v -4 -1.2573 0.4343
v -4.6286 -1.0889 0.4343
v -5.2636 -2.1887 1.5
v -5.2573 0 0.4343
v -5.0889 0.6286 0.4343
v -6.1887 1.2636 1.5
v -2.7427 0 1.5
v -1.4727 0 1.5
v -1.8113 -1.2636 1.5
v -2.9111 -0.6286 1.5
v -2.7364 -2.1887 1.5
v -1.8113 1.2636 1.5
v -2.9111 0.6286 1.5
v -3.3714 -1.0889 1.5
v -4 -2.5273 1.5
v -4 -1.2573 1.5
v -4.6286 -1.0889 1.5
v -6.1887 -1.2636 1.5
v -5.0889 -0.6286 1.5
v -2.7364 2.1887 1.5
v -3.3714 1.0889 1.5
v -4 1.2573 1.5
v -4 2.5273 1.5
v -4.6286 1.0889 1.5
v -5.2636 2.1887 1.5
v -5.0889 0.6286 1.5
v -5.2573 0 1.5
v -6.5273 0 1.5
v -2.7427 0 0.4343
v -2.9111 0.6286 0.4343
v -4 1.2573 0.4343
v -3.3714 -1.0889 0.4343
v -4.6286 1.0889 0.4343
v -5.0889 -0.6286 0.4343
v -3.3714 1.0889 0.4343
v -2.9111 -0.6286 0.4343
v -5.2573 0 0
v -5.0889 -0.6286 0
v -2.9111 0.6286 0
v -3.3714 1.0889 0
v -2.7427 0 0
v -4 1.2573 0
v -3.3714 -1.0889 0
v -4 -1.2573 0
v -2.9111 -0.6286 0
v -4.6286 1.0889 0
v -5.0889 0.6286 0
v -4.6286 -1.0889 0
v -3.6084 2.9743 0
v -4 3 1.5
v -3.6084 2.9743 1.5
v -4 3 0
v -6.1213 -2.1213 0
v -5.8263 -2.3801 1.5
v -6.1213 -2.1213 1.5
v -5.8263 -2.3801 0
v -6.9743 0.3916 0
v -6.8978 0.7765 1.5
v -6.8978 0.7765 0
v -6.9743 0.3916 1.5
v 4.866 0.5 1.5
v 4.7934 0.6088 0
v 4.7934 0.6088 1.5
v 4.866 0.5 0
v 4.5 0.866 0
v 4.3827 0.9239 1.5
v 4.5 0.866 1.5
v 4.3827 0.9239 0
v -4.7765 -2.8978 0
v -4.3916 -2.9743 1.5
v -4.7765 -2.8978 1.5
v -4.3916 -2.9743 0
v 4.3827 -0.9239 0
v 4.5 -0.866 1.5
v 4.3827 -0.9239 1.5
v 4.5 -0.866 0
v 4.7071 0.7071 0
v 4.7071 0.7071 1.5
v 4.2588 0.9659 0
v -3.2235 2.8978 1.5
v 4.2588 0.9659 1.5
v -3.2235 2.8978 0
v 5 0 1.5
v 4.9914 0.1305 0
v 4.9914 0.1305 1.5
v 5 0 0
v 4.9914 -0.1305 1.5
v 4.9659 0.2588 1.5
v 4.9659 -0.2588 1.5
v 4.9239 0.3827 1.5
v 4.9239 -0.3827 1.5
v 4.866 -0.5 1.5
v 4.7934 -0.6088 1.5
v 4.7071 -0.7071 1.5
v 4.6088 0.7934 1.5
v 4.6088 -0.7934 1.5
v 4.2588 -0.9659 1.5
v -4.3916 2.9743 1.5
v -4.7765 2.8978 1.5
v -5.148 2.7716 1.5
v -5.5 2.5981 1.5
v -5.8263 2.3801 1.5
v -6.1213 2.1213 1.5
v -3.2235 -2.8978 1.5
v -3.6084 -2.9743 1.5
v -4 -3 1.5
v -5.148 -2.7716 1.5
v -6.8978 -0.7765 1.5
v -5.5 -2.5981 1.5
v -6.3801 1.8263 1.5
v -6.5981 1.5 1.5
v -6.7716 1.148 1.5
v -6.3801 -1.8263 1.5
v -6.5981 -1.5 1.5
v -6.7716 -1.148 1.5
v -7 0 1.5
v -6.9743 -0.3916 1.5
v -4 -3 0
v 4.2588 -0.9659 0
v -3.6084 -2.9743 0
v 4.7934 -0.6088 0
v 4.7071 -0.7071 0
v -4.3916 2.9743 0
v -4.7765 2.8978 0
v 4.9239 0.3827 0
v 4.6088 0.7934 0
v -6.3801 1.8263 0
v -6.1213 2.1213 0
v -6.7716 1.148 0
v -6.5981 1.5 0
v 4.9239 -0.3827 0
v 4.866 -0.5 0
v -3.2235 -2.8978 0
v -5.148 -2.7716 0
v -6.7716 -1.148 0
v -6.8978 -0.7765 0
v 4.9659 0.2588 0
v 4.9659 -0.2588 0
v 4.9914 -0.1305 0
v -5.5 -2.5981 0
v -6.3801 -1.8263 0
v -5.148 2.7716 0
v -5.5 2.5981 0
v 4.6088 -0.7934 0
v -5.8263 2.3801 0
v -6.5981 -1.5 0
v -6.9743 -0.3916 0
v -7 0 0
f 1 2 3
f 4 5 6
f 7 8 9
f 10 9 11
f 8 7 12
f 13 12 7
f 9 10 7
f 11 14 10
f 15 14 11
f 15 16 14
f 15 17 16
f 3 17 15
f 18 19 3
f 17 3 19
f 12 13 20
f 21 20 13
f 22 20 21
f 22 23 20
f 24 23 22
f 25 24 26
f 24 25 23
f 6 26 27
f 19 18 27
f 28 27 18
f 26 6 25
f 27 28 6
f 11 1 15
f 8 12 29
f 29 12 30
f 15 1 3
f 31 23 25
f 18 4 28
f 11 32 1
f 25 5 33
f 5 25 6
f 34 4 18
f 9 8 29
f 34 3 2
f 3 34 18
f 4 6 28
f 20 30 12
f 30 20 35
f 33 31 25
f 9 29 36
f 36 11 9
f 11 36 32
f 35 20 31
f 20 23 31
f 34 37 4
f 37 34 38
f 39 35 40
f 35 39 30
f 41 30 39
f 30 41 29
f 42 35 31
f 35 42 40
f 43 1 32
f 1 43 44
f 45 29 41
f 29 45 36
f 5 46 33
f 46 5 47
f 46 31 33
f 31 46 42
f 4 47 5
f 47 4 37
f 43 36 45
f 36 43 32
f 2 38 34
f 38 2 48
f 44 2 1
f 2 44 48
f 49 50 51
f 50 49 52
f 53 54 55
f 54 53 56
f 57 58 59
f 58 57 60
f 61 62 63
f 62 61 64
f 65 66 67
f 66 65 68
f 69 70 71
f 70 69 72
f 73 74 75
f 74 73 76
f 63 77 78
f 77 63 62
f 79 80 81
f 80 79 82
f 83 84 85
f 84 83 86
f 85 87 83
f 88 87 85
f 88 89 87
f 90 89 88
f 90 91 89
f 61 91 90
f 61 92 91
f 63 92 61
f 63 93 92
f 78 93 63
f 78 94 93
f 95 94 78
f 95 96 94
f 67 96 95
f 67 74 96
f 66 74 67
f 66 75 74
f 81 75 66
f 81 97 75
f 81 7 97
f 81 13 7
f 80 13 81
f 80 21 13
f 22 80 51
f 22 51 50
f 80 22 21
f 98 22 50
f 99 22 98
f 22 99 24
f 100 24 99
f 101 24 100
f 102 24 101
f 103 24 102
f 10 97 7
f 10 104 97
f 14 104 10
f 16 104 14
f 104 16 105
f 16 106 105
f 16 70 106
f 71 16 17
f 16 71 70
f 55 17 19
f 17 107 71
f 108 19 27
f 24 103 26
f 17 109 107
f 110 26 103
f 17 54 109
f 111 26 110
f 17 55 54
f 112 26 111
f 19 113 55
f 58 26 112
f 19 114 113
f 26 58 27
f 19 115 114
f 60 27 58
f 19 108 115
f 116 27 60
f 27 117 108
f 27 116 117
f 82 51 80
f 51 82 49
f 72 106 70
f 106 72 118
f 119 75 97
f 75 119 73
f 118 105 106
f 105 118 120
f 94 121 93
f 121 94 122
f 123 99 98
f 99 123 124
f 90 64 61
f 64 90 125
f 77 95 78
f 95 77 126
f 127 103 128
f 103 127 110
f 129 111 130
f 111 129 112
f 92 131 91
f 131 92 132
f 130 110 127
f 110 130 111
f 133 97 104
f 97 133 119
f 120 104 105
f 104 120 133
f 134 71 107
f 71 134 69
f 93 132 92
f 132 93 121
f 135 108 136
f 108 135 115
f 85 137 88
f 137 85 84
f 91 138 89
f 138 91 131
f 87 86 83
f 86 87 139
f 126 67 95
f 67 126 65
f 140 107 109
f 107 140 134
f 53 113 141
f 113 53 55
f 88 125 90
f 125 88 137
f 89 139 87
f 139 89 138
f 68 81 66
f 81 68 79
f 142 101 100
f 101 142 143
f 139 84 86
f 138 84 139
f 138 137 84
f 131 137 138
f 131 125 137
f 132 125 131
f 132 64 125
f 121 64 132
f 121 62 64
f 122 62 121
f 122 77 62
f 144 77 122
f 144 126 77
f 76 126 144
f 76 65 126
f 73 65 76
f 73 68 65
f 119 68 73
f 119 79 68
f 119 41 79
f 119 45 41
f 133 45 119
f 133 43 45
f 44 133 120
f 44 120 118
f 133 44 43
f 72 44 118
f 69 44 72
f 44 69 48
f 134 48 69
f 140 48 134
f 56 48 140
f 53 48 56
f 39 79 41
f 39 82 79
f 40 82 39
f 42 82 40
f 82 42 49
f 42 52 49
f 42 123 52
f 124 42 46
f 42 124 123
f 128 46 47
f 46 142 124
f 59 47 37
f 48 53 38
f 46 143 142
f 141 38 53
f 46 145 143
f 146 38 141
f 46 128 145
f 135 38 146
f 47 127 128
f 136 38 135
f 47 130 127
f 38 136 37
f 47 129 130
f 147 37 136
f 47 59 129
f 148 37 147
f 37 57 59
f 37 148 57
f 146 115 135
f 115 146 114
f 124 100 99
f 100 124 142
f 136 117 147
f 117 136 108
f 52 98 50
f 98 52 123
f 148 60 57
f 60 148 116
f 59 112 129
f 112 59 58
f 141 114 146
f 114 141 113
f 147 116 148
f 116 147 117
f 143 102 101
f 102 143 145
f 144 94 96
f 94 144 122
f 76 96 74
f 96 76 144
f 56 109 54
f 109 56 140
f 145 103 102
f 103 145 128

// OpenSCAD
// Small picture frame clip

// Copyright (C) 2020 Jeremy Bennett <www.jeremybennett.com>

// Contributor: Jeremy Bennett <jeremy.bennett@embecosm.com>

// This file is licensed under the Creative Commons Attribution-ShareAlike 3.0
// Unported License. To view a copy of this license, visit
// http://creativecommons.org/licenses/by-sa/3.0/ or send a letter to Creative
// Commons, PO Box 1866, Mountain View, CA 94042, USA.


// Dimensions of a 3/8" no 3 wood screw

HEAD_DIAM = 0.199 * 25.4;           // x
SHANK_DIAM = 0.099 * 25.4;          // y
HEAD_ANGLE = 100.0;                 // B - not used explicitly

// The countersink height is calculated as:
//
//      x - y
//    ----------
//    2 tan(B/2)

CS_HEIGHT = 1.065656532;

// Clip dimensions
CLIP_H = 1.5;
CLIP_L = 8.0;
CLIP_MAJOR_D = 6.0;
CLIP_MINOR_D = 2.0;

// Hole for a countersink screw
module cs_hole() {
     cylinder(r1 = SHANK_DIAM / 2, r2 = HEAD_DIAM /2, h = CS_HEIGHT,
	      center = false, $fn = 12);
     cylinder(r = SHANK_DIAM / 2, h = CLIP_H * 3, center = true, $fn = 12);
}

// plain clip
module clip() {
     hull() {
	  translate(v = [-CLIP_L / 2, 0, 0])
	       cylinder(r = CLIP_MAJOR_D / 2, h = CLIP_H, center = false,
			$fn = 48);
	  translate(v = [CLIP_L / 2, 0, 0])
	       cylinder(r = CLIP_MINOR_D / 2, h = CLIP_H, center = false,
			$fn = 48);
     }
}

difference() {
     clip();
     translate(v = [-CLIP_L / 2, 0, CLIP_H-CS_HEIGHT])
	  cs_hole();
}
